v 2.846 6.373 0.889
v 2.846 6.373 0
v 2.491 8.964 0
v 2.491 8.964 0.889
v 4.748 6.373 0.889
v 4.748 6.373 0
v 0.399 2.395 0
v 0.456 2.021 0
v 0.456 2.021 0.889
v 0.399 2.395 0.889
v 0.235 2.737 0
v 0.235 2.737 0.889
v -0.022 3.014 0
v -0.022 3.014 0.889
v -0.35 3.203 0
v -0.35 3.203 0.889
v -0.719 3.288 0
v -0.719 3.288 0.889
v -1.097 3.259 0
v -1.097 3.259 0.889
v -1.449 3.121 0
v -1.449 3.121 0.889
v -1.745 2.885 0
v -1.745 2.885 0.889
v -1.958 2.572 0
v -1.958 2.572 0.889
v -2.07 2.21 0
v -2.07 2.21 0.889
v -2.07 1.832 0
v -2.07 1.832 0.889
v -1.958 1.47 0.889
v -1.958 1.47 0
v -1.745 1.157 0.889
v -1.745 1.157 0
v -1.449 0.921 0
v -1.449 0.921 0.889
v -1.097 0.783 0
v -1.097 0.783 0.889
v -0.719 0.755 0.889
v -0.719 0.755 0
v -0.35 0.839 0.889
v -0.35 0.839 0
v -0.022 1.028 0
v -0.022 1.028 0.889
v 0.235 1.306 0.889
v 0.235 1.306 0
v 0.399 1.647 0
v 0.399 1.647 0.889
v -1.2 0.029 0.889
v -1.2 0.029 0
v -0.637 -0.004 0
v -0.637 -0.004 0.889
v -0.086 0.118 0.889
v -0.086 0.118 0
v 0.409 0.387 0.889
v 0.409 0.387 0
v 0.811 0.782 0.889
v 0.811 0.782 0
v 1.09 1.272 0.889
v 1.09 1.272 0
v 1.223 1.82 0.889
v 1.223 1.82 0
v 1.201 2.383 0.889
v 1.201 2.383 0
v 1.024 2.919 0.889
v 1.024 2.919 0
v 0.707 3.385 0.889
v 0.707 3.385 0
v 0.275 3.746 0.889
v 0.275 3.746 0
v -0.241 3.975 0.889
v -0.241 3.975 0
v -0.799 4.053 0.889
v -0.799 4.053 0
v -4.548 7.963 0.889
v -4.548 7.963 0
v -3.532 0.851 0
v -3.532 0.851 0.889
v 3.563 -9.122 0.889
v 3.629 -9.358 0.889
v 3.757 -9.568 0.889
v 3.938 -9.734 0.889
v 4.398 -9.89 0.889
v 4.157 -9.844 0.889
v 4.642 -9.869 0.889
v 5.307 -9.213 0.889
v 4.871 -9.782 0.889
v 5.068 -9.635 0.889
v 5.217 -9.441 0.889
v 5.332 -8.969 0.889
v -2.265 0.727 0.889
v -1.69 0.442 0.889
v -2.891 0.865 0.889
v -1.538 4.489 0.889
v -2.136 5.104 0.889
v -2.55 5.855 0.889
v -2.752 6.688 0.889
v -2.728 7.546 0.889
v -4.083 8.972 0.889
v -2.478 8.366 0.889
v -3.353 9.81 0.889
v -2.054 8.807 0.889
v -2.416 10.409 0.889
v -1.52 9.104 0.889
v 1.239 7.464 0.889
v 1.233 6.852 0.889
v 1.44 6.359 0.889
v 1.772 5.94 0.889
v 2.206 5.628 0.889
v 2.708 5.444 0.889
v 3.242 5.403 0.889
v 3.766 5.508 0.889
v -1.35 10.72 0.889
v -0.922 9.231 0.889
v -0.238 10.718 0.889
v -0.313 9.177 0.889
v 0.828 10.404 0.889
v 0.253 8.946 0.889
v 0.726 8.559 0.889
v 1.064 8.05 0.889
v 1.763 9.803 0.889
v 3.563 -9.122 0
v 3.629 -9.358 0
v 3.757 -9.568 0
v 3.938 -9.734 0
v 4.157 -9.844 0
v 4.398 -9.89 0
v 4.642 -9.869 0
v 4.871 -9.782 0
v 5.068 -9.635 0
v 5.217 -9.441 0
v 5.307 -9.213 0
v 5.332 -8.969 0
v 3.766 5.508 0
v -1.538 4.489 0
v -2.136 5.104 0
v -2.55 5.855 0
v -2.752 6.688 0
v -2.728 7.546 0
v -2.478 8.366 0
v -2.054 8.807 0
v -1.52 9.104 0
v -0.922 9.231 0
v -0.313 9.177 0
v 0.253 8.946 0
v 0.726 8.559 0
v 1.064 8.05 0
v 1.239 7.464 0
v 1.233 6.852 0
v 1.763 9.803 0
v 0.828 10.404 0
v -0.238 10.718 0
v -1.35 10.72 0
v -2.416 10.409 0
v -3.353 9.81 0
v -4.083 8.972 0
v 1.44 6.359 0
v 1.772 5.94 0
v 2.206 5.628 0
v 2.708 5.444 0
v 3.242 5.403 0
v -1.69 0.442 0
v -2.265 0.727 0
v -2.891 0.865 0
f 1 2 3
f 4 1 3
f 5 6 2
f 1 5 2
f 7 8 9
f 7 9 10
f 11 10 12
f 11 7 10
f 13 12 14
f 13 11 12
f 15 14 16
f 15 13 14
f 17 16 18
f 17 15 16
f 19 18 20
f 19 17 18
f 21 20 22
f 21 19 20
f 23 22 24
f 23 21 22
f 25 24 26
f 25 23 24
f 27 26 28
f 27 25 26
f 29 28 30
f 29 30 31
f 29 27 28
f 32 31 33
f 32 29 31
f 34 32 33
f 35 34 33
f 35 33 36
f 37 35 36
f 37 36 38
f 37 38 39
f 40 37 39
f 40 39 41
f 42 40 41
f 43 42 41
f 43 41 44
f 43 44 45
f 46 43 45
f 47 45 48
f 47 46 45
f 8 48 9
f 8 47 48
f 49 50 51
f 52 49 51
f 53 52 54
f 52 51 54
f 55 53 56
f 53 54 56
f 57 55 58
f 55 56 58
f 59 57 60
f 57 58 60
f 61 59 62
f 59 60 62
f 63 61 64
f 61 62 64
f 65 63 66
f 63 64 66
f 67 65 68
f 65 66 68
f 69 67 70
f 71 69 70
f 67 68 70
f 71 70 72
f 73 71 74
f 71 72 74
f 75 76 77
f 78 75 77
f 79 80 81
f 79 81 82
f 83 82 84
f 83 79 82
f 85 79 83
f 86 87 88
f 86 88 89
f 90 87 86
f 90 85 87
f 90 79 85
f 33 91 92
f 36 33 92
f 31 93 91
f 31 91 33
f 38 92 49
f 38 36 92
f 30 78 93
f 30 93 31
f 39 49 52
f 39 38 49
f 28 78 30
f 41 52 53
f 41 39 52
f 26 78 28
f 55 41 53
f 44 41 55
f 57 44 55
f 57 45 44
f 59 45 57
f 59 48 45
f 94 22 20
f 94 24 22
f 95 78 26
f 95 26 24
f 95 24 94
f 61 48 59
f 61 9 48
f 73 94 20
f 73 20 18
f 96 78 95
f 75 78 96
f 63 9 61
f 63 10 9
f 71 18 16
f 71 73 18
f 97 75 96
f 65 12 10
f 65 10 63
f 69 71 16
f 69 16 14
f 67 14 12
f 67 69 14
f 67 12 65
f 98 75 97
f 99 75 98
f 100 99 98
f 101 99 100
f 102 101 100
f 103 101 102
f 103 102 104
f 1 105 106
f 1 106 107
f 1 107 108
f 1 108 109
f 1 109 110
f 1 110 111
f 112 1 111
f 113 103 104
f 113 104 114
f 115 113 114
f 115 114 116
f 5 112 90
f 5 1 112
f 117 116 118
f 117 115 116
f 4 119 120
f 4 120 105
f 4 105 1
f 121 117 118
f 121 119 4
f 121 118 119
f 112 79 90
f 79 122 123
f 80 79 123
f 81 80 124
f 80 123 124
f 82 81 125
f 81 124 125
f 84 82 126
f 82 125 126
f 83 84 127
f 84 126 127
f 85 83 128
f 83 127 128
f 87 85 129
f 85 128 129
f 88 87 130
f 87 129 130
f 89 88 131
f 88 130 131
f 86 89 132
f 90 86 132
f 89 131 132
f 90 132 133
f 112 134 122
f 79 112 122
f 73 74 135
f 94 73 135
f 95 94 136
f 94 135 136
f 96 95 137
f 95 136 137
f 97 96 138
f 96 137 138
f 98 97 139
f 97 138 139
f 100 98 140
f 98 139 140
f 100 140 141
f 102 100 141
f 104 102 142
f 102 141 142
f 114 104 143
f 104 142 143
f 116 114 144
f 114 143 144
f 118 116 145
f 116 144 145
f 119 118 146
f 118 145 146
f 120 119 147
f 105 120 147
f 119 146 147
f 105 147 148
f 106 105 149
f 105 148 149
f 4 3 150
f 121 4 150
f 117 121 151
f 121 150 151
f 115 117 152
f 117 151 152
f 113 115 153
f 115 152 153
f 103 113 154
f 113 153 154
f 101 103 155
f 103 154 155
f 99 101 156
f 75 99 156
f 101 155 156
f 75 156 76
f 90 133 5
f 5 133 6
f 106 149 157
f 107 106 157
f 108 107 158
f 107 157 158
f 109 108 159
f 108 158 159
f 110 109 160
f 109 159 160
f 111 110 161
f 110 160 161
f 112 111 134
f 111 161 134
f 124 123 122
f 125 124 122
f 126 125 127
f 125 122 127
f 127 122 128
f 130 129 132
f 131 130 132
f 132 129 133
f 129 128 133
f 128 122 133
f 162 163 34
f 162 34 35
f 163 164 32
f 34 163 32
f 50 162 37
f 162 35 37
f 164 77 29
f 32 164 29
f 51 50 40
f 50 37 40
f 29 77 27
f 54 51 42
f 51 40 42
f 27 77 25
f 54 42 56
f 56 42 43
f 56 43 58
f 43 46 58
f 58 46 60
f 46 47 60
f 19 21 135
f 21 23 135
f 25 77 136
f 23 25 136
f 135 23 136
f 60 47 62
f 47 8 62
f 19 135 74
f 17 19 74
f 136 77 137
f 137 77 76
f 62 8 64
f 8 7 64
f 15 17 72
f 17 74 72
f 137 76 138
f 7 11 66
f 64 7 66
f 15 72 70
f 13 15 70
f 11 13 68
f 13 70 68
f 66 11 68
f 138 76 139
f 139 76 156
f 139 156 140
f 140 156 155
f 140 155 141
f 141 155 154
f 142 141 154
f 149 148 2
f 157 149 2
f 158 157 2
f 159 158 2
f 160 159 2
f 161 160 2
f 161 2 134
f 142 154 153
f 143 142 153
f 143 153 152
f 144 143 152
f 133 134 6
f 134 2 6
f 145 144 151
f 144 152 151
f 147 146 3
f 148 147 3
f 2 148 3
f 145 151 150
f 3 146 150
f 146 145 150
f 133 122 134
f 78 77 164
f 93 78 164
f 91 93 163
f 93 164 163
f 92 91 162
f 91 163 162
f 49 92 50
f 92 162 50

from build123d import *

# Parameters (mm, degrees)
SKETCH1_R           = 1.27
BOSS_EXTRUDE1_DEPTH = 0.889


with BuildPart() as part:
    # Sketch1 → Boss-Extrude1 (new body)
    with BuildSketch(Plane.XY):
        with BuildLine():
            Line((-4.547993368, 7.962766742), (-3.531993368, 0.850766742))
            ThreePointArc((-3.531993368, 0.850766742), (-2.264773091, 0.726570958), (-1.1995543, 0.029017555))
            ThreePointArc((-1.1995543, 0.029017555), (1.223134016, 1.819786094), (-0.798867095, 4.053120405))
            ThreePointArc((-0.798867095, 4.053120405), (-2.550299683, 5.854814329), (-2.477808037, 8.36645962))
            ThreePointArc((-2.477808037, 8.36645962), (-0.021575309, 9.082238313), (1.232714018, 6.852400507))
            ThreePointArc((1.232714018, 6.852400507), (2.205993955, 5.627515221), (3.765914813, 5.508080224))
            Line((3.765914813, 5.508080224), (3.562714813, -9.122319776))
            ThreePointArc((3.562714813, -9.122319776), (4.52052525, -9.888145198), (5.331956505, -8.968651464))
            Line((5.331956505, -8.968651464), (4.747756505, 6.372948536))
            Line((4.747756505, 6.372948536), (2.846185733, 6.372948536))
            Line((2.846185733, 6.372948536), (2.490585733, 8.963748536))
            ThreePointArc((2.490585733, 8.963748536), (-1.349608466, 10.719754973), (-4.547993368, 7.962766742))
        make_face()
        with Locations((-0.814199649, 2.021120405)):
            Circle(SKETCH1_R, mode=Mode.SUBTRACT)
    extrude(amount=BOSS_EXTRUDE1_DEPTH)


solid = part.part
